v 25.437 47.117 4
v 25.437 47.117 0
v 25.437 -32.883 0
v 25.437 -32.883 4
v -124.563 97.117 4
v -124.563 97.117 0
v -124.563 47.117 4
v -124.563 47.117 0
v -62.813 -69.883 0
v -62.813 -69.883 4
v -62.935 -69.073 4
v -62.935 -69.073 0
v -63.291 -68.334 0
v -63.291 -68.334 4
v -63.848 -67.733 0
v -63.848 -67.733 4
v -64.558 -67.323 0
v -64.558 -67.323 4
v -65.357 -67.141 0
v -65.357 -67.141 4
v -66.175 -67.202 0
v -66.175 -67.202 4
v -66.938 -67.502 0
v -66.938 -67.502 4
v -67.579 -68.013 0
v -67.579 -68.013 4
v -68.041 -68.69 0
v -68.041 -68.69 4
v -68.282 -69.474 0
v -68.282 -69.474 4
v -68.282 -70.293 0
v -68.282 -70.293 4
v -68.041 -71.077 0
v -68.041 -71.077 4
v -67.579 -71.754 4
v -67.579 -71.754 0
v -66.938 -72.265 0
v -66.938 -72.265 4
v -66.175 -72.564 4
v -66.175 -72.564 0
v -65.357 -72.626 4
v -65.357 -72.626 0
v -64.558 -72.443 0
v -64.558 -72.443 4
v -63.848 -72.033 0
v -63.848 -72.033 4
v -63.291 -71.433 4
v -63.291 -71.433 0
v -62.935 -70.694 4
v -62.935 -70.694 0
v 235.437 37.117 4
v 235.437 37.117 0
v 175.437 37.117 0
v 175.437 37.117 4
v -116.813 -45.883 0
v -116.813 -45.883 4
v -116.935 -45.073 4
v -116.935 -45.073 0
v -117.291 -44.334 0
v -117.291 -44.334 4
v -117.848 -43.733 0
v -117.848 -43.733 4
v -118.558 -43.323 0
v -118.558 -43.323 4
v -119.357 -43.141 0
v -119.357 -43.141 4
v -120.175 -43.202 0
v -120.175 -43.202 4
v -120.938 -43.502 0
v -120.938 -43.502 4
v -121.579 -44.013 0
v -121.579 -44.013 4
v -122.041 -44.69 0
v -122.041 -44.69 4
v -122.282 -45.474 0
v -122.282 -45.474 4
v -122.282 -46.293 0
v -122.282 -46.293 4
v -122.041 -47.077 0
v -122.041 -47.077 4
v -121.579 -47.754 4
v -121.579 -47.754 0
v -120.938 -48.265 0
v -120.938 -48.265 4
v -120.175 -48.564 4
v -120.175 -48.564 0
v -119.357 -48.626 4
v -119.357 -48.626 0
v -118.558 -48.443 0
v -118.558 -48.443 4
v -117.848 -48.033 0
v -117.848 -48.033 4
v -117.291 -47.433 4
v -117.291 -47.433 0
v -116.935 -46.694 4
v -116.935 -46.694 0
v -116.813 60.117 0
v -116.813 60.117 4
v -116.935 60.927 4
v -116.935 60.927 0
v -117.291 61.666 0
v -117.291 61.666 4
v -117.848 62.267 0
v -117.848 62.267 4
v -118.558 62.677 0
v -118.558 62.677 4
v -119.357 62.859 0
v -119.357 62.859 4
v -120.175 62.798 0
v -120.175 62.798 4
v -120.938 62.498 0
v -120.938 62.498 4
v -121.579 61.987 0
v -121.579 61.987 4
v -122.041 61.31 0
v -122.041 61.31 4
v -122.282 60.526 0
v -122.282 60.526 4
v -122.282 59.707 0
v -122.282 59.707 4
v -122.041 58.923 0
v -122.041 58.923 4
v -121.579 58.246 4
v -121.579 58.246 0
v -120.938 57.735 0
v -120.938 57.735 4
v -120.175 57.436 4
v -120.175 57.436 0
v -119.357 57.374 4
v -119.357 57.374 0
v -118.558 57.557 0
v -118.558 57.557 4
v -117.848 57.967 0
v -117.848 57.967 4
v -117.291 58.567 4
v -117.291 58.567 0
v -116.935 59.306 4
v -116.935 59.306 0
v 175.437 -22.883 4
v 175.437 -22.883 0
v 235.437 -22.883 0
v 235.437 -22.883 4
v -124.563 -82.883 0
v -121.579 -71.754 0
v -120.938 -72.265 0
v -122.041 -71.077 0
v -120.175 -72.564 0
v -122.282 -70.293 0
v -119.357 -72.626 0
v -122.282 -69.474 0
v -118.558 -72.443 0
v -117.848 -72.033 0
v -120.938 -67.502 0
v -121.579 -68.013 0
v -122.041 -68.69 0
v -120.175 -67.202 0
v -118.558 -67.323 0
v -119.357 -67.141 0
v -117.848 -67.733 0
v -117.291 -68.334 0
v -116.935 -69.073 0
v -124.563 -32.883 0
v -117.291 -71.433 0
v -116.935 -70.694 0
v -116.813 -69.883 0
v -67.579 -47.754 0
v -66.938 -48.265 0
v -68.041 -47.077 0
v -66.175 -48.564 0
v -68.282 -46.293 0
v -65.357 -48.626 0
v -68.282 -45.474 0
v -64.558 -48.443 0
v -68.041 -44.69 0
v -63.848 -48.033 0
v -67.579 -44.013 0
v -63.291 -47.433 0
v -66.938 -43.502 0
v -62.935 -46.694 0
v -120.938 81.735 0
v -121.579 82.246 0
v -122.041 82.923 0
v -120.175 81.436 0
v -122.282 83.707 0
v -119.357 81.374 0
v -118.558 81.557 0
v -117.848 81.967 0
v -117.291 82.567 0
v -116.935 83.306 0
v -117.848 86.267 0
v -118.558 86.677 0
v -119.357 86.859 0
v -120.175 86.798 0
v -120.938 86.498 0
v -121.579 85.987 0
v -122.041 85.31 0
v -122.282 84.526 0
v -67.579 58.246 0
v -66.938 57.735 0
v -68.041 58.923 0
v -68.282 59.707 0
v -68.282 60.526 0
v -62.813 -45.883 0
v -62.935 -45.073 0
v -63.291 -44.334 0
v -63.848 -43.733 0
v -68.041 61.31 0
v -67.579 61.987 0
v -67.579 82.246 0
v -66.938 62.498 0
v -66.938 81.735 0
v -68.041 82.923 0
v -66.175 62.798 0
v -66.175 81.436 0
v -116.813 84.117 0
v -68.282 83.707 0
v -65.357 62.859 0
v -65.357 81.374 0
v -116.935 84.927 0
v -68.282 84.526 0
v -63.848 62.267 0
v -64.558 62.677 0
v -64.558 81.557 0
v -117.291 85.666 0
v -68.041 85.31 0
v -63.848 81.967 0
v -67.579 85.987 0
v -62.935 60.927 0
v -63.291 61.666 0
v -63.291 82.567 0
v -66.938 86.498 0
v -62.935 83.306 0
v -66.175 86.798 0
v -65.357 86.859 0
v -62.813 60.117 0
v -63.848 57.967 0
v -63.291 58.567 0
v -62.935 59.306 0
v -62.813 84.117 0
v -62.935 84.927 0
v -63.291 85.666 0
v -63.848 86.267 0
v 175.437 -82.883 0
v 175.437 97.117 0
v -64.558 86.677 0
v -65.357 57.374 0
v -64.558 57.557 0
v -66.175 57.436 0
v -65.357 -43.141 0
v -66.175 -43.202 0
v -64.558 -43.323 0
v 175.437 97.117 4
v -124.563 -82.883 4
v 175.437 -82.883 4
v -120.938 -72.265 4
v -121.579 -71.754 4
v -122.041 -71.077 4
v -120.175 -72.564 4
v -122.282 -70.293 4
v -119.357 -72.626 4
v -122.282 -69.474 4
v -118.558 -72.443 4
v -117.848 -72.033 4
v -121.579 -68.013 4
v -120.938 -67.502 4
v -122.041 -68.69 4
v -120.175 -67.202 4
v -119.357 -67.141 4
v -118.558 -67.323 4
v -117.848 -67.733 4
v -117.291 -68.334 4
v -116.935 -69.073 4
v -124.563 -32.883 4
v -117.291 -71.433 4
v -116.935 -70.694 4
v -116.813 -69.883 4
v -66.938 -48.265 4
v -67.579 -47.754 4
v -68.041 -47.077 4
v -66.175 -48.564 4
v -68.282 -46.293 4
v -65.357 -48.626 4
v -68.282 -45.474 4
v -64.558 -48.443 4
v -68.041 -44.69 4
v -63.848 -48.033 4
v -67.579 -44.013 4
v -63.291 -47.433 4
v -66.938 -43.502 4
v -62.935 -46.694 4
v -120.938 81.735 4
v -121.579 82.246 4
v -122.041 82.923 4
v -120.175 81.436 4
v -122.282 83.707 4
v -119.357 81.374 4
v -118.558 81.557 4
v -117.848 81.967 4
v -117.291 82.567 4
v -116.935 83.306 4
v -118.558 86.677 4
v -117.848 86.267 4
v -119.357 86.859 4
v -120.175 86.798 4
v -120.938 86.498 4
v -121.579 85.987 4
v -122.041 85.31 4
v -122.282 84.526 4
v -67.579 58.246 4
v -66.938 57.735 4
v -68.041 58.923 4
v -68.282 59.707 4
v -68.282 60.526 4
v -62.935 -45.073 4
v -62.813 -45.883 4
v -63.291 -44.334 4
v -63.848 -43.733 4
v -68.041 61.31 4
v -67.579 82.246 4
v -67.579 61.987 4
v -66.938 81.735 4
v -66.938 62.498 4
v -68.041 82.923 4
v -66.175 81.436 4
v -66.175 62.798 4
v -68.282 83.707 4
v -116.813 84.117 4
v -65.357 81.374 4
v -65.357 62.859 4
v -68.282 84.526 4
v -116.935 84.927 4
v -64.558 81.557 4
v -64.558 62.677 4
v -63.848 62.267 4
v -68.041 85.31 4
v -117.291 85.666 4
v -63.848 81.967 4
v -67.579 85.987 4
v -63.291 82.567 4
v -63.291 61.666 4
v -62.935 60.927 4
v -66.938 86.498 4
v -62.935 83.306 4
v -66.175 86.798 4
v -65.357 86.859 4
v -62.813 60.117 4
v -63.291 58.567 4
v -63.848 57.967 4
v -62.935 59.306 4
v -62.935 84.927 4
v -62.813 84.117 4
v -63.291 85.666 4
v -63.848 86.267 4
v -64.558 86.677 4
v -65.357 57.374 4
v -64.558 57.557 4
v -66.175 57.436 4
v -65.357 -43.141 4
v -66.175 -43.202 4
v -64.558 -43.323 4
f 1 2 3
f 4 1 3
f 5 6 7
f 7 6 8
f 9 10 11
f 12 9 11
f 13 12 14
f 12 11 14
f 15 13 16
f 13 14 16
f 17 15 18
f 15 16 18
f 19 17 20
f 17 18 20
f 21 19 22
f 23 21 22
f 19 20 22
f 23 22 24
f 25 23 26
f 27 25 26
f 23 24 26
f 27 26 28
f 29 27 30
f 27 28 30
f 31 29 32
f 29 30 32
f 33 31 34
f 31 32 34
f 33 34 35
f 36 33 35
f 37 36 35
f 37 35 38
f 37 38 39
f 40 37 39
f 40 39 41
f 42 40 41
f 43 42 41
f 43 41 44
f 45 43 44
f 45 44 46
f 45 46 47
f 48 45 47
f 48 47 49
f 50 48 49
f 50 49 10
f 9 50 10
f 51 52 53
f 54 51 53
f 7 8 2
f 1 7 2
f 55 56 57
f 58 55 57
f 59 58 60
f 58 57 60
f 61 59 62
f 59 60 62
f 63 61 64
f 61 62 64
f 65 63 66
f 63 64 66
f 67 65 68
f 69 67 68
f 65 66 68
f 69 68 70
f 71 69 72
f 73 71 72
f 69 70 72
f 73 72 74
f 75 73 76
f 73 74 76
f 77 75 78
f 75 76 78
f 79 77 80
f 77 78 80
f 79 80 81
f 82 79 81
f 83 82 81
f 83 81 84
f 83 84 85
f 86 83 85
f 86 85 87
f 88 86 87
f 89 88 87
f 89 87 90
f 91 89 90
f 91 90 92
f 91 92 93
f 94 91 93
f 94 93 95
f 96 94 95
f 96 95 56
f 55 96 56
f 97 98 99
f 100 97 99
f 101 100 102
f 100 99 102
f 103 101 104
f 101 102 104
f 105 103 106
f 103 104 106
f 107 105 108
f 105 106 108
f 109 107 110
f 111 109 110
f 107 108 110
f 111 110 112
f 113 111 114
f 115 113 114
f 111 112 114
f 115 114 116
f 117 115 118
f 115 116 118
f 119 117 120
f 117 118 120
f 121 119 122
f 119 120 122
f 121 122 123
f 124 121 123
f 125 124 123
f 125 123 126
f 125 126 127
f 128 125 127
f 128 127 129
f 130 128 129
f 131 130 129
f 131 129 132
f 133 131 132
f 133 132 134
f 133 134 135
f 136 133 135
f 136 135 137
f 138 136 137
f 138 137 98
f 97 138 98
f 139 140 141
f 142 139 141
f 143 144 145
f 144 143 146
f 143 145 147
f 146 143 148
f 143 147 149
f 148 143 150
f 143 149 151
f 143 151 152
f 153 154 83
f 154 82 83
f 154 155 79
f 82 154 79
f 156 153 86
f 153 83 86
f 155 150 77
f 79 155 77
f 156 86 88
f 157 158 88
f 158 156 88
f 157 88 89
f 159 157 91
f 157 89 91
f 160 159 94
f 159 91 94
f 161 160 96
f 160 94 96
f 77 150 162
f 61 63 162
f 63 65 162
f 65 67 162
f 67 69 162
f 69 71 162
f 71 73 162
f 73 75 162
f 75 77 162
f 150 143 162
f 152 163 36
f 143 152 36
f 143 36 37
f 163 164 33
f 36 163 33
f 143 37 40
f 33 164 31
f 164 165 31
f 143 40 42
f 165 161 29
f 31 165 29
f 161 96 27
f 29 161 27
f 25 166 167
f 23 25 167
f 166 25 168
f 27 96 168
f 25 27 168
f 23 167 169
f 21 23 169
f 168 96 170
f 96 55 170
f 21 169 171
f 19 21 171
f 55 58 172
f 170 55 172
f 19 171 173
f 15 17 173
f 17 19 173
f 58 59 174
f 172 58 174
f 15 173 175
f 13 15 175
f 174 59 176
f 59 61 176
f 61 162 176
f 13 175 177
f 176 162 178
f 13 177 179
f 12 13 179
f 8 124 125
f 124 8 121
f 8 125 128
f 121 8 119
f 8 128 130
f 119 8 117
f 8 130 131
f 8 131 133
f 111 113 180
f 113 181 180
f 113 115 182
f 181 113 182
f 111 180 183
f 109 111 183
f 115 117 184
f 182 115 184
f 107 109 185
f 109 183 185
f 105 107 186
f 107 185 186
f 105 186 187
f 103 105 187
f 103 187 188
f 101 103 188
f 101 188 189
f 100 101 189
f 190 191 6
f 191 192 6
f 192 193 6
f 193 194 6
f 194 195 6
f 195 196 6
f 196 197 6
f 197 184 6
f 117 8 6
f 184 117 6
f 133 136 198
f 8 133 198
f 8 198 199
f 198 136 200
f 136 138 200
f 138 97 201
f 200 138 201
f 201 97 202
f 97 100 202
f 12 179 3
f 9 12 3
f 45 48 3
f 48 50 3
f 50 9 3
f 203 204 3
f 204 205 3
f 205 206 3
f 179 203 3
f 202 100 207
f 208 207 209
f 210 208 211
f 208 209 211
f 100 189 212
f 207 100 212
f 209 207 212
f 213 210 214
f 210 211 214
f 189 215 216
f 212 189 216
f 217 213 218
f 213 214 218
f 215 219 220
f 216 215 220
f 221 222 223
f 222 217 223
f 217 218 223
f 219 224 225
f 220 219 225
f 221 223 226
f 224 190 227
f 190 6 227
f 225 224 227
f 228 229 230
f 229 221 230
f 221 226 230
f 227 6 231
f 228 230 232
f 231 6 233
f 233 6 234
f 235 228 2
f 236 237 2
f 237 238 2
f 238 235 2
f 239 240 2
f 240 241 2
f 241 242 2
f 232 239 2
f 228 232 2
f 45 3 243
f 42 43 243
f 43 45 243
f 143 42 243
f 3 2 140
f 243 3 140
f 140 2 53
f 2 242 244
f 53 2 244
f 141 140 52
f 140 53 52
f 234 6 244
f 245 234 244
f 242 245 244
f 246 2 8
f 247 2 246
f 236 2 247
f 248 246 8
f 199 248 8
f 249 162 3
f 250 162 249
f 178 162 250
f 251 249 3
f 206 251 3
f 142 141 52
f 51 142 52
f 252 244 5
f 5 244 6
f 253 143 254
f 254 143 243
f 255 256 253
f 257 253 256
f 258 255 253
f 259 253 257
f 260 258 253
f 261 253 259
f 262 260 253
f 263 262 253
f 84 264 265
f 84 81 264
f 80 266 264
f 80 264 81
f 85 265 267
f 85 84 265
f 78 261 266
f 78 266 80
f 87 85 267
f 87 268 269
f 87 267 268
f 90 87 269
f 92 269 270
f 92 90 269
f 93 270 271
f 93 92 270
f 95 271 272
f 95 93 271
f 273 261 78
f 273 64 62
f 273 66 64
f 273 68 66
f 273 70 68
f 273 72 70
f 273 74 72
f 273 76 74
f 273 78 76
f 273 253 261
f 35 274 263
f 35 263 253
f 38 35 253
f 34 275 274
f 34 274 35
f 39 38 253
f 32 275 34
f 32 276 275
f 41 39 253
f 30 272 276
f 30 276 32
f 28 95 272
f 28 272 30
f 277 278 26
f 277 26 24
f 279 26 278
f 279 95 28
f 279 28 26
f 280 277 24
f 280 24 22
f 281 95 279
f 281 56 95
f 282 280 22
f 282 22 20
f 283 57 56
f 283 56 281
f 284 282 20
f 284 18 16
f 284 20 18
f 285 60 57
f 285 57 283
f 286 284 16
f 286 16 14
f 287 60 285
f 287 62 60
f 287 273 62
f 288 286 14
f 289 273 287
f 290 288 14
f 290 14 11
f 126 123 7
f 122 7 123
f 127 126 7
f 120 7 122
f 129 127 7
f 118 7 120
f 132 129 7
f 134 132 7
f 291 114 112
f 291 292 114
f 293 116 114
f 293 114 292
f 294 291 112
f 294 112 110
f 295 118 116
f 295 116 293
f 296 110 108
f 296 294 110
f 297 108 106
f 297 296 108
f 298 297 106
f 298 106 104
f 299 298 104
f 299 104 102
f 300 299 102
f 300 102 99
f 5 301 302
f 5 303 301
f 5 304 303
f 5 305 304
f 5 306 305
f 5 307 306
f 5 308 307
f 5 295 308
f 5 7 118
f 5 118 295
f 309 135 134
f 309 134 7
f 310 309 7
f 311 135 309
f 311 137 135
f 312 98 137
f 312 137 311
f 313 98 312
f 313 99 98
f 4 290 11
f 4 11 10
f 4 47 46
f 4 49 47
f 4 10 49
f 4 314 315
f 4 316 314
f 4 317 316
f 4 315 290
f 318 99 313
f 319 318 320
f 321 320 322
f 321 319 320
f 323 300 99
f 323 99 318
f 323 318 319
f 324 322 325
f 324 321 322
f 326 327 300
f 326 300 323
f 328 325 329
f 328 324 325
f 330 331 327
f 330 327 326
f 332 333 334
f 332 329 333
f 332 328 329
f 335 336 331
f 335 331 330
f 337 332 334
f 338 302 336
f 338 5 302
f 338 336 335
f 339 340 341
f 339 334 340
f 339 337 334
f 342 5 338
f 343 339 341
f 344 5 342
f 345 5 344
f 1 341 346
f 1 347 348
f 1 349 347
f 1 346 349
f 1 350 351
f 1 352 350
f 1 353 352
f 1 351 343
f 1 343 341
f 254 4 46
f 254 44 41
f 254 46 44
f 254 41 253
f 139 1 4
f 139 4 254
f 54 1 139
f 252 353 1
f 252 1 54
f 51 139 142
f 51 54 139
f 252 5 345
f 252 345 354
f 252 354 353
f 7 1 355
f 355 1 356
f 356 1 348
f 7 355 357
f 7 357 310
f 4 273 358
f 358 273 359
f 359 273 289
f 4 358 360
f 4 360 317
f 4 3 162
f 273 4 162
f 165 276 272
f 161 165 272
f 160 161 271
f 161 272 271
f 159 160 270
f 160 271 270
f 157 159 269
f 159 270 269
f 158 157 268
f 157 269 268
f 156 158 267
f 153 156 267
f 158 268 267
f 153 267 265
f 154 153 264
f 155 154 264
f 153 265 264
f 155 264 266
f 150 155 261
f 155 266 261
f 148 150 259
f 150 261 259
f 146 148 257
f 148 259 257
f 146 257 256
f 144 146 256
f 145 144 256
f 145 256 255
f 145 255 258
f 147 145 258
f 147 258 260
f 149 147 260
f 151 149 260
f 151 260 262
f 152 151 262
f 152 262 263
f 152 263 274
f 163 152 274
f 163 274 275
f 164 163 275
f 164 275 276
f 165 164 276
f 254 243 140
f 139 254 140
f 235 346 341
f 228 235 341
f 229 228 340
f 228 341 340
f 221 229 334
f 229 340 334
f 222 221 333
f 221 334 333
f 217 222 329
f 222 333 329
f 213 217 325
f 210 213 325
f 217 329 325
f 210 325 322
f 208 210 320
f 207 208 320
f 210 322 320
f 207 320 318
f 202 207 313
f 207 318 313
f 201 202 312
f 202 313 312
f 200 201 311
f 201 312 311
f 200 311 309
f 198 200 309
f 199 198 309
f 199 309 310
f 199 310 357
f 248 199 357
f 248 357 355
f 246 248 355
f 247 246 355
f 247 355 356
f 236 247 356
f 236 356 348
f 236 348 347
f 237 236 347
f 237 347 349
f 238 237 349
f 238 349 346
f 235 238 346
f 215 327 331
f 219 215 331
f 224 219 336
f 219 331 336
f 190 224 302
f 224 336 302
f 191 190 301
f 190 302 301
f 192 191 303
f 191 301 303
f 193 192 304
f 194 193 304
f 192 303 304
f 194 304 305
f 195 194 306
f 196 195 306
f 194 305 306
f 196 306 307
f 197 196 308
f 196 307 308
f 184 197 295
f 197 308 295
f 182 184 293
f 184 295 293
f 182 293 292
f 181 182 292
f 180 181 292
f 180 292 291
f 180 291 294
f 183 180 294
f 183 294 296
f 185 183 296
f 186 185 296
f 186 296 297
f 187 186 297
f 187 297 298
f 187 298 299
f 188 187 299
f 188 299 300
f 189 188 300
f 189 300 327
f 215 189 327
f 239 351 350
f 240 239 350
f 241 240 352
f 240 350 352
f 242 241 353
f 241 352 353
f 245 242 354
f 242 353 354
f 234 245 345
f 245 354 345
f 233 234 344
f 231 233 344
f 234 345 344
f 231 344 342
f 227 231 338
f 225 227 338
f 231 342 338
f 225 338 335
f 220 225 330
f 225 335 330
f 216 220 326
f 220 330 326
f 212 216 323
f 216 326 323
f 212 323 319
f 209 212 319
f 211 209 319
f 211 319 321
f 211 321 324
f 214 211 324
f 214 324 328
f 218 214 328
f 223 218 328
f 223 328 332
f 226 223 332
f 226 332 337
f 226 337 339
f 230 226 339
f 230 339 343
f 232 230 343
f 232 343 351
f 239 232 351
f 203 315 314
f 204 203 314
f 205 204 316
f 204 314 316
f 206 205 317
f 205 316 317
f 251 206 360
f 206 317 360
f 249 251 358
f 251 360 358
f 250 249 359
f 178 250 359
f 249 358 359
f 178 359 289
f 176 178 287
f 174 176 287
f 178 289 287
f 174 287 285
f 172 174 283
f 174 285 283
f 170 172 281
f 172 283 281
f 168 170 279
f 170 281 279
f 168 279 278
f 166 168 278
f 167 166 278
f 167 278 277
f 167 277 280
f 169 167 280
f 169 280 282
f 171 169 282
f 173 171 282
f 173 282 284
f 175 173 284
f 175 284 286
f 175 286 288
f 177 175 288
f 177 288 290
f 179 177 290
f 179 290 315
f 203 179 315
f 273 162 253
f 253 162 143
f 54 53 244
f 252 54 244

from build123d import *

# Parameters (mm, degrees)
F1_DEPTH = 4
F2_R     = 2.75
F3_DEPTH = 5


with BuildPart() as f1:
    # F0 (on Top) → F1 (new body)
    with BuildSketch(Plane.XY):
        Polygon((175.437126, 97.116617), (-124.562874, 97.116617), (-124.562874, 47.116617), (25.437126, 47.116617), (25.437126, -32.883383), (-124.562874, -32.883383), (-124.562874, -82.883383), (175.437126, -82.883383), (175.437126, -22.883383), (235.437126, -22.883383), (235.437126, 37.116617), (175.437126, 37.116617), align=None)
    extrude(amount=F1_DEPTH)

    # F2 (on face) → F3 (cut)
    with BuildSketch(Plane.XY.offset(4)):
        with Locations((-119.562874, 84.116617)):
            Circle(F2_R)
        with Locations((-65.562874, 84.116617)):
            Circle(F2_R)
        with Locations((-65.562874, 60.116617)):
            Circle(F2_R)
        with Locations((-119.562874, 60.116617)):
            Circle(F2_R)
        with Locations((-119.562874, -45.883383)):
            Circle(F2_R)
        with Locations((-119.562874, -69.883383)):
            Circle(F2_R)
        with Locations((-65.562874, -45.883383)):
            Circle(F2_R)
        with Locations((-65.562874, -69.883383)):
            Circle(F2_R)
    extrude(amount=-F3_DEPTH, mode=Mode.SUBTRACT)


solid = f1.part
